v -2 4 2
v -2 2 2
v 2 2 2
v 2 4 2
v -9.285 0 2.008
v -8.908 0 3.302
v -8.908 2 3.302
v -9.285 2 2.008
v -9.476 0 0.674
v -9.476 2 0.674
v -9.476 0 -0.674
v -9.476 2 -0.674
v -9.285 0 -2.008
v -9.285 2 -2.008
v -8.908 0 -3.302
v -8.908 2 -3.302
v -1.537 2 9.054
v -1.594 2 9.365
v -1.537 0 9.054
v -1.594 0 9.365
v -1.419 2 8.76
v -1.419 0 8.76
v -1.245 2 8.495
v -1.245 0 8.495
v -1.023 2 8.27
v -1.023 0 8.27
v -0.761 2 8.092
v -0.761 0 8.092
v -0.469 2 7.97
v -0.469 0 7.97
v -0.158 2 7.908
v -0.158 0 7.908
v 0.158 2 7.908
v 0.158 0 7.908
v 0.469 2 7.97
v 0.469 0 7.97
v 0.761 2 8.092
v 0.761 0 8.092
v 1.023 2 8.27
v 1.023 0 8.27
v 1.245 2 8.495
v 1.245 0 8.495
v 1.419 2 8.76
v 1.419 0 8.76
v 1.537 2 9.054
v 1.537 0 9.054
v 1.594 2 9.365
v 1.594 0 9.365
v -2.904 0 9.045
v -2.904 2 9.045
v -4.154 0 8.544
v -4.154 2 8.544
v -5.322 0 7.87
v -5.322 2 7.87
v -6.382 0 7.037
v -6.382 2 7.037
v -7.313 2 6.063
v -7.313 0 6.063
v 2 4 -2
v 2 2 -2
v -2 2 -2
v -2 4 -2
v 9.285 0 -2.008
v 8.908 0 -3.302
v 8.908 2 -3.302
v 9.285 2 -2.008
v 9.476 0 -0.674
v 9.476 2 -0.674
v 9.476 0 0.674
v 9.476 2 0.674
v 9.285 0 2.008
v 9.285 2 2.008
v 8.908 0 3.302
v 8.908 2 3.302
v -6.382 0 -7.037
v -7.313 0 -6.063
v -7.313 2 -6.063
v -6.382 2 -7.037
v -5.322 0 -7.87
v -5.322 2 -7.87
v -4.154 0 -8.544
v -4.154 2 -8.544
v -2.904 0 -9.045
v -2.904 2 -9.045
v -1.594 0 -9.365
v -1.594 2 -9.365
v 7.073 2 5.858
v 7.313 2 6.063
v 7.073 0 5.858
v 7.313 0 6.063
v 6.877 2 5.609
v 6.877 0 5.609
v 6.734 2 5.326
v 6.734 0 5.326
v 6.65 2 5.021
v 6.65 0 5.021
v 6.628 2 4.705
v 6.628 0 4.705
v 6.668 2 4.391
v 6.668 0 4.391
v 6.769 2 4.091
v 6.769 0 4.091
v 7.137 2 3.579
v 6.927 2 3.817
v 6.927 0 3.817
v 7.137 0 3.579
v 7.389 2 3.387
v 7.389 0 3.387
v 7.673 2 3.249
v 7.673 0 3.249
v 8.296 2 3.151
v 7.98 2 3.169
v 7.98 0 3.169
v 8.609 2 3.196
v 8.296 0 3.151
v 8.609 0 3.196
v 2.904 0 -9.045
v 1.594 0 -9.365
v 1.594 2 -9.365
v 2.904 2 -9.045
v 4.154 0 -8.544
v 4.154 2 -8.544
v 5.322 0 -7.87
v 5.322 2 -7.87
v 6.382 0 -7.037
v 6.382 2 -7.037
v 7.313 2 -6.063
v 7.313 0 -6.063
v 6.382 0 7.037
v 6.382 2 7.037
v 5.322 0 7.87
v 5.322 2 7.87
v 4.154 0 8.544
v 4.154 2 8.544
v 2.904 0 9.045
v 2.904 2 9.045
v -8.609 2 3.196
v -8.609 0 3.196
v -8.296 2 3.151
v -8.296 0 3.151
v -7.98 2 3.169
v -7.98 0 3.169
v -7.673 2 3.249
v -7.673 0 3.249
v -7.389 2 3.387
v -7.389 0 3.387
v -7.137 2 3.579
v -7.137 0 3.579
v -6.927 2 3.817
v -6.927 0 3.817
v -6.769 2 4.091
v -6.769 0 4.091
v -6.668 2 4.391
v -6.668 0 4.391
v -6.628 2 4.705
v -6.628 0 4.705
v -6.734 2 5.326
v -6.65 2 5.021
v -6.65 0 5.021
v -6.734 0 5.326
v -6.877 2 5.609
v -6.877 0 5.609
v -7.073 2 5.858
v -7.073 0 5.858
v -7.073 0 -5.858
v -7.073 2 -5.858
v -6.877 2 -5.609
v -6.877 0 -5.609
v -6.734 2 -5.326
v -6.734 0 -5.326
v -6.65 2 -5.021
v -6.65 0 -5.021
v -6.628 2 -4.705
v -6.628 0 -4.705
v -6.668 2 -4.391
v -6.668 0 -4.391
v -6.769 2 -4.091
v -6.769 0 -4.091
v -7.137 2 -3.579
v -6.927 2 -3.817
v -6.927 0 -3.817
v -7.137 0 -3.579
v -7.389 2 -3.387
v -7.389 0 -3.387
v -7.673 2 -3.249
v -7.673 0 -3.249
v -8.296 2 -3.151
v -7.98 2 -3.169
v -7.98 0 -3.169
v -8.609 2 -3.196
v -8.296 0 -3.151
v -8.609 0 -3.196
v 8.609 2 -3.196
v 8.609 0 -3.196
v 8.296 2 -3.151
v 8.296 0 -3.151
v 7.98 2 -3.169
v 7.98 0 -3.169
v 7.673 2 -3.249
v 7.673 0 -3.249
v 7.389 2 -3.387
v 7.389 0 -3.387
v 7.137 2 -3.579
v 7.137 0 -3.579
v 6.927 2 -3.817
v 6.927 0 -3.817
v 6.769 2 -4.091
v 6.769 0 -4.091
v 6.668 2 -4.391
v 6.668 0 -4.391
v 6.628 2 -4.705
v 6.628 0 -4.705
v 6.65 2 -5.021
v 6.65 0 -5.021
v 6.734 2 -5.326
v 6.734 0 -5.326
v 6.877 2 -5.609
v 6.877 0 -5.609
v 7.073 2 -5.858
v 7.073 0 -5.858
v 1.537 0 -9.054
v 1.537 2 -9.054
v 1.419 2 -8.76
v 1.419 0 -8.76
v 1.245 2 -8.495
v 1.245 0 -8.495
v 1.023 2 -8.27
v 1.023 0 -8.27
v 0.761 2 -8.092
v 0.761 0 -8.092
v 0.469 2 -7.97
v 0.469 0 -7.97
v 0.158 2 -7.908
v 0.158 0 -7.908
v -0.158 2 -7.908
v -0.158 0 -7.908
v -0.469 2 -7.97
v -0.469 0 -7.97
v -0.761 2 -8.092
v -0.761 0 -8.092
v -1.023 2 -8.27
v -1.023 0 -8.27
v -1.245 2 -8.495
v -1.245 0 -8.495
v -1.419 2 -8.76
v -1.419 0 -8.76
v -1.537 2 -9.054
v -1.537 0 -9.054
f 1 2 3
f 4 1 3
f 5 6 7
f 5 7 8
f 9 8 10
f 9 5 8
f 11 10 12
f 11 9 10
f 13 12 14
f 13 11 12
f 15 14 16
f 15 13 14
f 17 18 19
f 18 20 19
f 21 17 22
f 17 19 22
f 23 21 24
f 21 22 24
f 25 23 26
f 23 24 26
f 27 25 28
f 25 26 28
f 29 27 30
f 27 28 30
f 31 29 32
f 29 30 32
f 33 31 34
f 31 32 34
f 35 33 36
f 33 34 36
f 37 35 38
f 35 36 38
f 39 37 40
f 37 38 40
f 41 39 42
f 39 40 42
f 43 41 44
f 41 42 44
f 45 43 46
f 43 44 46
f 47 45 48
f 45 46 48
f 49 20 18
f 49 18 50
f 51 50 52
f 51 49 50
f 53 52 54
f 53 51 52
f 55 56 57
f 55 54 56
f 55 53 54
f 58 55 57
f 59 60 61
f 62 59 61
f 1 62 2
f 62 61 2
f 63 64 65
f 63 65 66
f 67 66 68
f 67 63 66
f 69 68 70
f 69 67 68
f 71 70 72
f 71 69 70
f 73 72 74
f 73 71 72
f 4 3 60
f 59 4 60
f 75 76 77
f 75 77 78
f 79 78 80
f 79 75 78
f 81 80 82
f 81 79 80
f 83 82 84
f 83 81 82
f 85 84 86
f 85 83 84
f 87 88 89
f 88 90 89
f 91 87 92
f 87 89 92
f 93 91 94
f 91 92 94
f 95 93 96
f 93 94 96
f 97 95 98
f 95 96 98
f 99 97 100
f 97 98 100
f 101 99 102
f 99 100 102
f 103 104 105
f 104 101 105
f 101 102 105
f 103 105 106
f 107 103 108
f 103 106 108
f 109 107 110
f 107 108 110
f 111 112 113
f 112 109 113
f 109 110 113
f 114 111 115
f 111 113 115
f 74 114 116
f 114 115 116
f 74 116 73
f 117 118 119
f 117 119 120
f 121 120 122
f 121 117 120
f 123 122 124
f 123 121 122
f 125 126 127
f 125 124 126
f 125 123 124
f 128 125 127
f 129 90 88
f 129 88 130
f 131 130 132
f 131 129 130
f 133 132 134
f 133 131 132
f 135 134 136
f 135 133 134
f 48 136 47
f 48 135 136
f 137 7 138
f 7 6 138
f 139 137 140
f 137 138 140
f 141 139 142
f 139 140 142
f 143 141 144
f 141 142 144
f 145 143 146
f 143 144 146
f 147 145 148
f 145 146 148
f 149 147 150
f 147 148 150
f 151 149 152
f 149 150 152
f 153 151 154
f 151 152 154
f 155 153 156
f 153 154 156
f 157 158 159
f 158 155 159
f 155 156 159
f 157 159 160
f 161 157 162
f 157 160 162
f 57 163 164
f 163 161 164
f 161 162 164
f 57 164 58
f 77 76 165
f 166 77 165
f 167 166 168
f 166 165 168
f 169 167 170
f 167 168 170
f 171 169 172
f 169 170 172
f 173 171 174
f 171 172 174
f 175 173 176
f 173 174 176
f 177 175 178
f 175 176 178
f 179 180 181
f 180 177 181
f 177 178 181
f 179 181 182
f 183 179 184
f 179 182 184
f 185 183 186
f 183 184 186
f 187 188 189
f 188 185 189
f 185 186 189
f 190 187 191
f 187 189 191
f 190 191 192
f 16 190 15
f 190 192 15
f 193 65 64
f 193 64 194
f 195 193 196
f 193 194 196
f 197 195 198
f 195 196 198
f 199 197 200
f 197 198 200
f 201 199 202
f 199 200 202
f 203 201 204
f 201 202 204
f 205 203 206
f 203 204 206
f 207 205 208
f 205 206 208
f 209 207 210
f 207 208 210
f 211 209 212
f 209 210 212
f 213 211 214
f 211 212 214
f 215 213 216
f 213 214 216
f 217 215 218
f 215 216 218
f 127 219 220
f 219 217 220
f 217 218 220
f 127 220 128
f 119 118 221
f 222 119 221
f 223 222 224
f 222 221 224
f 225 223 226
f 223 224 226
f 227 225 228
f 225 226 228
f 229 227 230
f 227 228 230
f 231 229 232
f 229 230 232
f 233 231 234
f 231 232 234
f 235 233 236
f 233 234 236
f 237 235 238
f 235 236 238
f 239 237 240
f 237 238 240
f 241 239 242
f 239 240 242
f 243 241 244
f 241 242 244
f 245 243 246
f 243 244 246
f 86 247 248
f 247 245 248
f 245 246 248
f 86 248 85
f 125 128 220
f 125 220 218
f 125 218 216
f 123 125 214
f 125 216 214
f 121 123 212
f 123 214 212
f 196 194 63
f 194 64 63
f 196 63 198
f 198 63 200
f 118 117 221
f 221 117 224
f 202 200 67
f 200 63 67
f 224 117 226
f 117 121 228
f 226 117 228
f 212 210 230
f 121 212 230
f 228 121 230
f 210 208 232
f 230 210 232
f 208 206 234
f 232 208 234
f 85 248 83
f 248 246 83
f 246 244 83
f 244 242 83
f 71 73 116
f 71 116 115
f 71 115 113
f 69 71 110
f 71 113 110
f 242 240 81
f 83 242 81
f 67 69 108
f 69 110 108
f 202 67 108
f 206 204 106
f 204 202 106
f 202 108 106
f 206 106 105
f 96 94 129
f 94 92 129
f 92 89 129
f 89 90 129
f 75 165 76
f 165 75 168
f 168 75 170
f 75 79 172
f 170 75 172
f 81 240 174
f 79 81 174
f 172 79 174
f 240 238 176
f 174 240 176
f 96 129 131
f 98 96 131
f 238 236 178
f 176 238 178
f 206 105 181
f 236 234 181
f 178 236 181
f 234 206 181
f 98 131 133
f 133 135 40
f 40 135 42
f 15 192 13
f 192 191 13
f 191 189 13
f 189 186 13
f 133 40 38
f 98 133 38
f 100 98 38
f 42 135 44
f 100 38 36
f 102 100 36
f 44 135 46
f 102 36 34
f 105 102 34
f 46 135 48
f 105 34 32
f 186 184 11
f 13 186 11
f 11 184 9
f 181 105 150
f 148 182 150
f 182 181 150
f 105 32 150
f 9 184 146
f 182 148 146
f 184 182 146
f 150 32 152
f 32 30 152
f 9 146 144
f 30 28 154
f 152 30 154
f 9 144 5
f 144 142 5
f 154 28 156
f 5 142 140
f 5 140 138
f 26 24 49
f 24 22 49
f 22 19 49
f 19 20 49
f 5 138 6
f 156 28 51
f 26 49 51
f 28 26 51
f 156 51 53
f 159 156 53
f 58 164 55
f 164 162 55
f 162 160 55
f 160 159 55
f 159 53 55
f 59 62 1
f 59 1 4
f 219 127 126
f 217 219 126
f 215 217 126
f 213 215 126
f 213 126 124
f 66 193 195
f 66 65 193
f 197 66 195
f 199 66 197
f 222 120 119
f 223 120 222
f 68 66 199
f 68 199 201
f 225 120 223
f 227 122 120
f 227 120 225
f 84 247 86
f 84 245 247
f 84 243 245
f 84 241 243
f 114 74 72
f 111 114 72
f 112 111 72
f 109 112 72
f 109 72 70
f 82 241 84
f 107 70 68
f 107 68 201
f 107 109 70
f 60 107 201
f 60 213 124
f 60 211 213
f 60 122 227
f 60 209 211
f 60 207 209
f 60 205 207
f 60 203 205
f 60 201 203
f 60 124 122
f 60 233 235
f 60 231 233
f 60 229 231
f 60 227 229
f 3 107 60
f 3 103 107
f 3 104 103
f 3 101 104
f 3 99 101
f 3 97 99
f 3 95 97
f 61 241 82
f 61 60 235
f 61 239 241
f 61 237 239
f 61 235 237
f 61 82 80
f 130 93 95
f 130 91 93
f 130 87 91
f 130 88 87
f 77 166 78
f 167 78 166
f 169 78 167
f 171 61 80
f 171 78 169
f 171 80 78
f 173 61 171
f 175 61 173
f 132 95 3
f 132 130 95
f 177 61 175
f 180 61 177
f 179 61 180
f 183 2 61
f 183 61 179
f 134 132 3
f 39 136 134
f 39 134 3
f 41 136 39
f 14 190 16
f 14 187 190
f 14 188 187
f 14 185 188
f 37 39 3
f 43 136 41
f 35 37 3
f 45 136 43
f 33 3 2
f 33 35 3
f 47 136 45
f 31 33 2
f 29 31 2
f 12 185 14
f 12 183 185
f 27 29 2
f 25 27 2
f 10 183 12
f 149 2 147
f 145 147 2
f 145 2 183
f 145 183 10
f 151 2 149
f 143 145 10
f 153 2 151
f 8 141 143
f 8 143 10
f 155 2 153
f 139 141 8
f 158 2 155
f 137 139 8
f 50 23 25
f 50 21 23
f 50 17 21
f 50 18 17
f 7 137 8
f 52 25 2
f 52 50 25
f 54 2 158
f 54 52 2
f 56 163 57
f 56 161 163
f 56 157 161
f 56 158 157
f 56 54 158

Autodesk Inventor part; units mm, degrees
ref_plane "YZ Plane" through (0, 0, 0) normal (1, 0, 0) x (0, 1, 0)
ref_plane "XZ Plane" through (0, 0, 0) normal (0, 1, 0) x (-1, 0, 0)
ref_plane "XY Plane" through (0, 0, 0) normal (0, 0, 1) x (1, 0, 0)
sketch "Sketch1" plane through (0, 0, 0) normal (0, 1, 0) x (-1, 0, 0)
  arc A0 (1.5943, -9.3653) -> (-1.5943, -9.3653) centre (0, -9.5) ccw
  arc A1 (8.9077, -3.3019) -> (7.3134, -6.0634) centre (8.2272, -4.75) ccw
  arc A2 (7.3134, 6.0634) -> (8.9077, 3.3019) centre (8.2272, 4.75) ccw
  arc A3 (-1.5943, 9.3653) -> (1.5943, 9.3653) centre (0, 9.5) ccw
  arc A4 (-8.9077, 3.3019) -> (-7.3134, 6.0634) centre (-8.2272, 4.75) ccw
  arc A5 (-7.3134, -6.0634) -> (-8.9077, -3.3019) centre (-8.2272, -4.75) ccw
  arc A6 (1.5943, -9.3653) -> (7.3134, -6.0634) centre (0, 0) ccw
  arc A7 (8.9077, -3.3019) -> (8.9077, 3.3019) centre (0, 0) ccw
  arc A8 (7.3134, 6.0634) -> (1.5943, 9.3653) centre (0, 0) ccw
  arc A9 (-1.5943, 9.3653) -> (-7.3134, 6.0634) centre (0, 0) ccw
  arc A10 (-8.9077, 3.3019) -> (-8.9077, -3.3019) centre (0, 0) ccw
  arc A11 (-7.3134, -6.0634) -> (-1.5943, -9.3653) centre (0, 0) ccw
  dimension "d1" = 3.2
  dimension "d4" = 360
extrude "Extrusion1" add sketch "Sketch1" along normal blind 2
sketch "Sketch2" plane through (0, 2, 0) normal (0, 1, 0) x (1, 0, 0)
  line L0 (2, 2) -> (-2, 2)
  line L1 (-2, 2) -> (-2, -2)
  line L2 (-2, -2) -> (2, -2)
  line L3 (2, -2) -> (2, 2)
  line L4 (2, 2) -> (-2, -2) construction
  line L5 (-2, 2) -> (2, -2) construction
  point P0 (0, 0)
  dimension "d8" = 4
  dimension "d9" = 4
extrude "Extrusion2" add sketch "Sketch2" along normal blind 2
properties part number "led"
